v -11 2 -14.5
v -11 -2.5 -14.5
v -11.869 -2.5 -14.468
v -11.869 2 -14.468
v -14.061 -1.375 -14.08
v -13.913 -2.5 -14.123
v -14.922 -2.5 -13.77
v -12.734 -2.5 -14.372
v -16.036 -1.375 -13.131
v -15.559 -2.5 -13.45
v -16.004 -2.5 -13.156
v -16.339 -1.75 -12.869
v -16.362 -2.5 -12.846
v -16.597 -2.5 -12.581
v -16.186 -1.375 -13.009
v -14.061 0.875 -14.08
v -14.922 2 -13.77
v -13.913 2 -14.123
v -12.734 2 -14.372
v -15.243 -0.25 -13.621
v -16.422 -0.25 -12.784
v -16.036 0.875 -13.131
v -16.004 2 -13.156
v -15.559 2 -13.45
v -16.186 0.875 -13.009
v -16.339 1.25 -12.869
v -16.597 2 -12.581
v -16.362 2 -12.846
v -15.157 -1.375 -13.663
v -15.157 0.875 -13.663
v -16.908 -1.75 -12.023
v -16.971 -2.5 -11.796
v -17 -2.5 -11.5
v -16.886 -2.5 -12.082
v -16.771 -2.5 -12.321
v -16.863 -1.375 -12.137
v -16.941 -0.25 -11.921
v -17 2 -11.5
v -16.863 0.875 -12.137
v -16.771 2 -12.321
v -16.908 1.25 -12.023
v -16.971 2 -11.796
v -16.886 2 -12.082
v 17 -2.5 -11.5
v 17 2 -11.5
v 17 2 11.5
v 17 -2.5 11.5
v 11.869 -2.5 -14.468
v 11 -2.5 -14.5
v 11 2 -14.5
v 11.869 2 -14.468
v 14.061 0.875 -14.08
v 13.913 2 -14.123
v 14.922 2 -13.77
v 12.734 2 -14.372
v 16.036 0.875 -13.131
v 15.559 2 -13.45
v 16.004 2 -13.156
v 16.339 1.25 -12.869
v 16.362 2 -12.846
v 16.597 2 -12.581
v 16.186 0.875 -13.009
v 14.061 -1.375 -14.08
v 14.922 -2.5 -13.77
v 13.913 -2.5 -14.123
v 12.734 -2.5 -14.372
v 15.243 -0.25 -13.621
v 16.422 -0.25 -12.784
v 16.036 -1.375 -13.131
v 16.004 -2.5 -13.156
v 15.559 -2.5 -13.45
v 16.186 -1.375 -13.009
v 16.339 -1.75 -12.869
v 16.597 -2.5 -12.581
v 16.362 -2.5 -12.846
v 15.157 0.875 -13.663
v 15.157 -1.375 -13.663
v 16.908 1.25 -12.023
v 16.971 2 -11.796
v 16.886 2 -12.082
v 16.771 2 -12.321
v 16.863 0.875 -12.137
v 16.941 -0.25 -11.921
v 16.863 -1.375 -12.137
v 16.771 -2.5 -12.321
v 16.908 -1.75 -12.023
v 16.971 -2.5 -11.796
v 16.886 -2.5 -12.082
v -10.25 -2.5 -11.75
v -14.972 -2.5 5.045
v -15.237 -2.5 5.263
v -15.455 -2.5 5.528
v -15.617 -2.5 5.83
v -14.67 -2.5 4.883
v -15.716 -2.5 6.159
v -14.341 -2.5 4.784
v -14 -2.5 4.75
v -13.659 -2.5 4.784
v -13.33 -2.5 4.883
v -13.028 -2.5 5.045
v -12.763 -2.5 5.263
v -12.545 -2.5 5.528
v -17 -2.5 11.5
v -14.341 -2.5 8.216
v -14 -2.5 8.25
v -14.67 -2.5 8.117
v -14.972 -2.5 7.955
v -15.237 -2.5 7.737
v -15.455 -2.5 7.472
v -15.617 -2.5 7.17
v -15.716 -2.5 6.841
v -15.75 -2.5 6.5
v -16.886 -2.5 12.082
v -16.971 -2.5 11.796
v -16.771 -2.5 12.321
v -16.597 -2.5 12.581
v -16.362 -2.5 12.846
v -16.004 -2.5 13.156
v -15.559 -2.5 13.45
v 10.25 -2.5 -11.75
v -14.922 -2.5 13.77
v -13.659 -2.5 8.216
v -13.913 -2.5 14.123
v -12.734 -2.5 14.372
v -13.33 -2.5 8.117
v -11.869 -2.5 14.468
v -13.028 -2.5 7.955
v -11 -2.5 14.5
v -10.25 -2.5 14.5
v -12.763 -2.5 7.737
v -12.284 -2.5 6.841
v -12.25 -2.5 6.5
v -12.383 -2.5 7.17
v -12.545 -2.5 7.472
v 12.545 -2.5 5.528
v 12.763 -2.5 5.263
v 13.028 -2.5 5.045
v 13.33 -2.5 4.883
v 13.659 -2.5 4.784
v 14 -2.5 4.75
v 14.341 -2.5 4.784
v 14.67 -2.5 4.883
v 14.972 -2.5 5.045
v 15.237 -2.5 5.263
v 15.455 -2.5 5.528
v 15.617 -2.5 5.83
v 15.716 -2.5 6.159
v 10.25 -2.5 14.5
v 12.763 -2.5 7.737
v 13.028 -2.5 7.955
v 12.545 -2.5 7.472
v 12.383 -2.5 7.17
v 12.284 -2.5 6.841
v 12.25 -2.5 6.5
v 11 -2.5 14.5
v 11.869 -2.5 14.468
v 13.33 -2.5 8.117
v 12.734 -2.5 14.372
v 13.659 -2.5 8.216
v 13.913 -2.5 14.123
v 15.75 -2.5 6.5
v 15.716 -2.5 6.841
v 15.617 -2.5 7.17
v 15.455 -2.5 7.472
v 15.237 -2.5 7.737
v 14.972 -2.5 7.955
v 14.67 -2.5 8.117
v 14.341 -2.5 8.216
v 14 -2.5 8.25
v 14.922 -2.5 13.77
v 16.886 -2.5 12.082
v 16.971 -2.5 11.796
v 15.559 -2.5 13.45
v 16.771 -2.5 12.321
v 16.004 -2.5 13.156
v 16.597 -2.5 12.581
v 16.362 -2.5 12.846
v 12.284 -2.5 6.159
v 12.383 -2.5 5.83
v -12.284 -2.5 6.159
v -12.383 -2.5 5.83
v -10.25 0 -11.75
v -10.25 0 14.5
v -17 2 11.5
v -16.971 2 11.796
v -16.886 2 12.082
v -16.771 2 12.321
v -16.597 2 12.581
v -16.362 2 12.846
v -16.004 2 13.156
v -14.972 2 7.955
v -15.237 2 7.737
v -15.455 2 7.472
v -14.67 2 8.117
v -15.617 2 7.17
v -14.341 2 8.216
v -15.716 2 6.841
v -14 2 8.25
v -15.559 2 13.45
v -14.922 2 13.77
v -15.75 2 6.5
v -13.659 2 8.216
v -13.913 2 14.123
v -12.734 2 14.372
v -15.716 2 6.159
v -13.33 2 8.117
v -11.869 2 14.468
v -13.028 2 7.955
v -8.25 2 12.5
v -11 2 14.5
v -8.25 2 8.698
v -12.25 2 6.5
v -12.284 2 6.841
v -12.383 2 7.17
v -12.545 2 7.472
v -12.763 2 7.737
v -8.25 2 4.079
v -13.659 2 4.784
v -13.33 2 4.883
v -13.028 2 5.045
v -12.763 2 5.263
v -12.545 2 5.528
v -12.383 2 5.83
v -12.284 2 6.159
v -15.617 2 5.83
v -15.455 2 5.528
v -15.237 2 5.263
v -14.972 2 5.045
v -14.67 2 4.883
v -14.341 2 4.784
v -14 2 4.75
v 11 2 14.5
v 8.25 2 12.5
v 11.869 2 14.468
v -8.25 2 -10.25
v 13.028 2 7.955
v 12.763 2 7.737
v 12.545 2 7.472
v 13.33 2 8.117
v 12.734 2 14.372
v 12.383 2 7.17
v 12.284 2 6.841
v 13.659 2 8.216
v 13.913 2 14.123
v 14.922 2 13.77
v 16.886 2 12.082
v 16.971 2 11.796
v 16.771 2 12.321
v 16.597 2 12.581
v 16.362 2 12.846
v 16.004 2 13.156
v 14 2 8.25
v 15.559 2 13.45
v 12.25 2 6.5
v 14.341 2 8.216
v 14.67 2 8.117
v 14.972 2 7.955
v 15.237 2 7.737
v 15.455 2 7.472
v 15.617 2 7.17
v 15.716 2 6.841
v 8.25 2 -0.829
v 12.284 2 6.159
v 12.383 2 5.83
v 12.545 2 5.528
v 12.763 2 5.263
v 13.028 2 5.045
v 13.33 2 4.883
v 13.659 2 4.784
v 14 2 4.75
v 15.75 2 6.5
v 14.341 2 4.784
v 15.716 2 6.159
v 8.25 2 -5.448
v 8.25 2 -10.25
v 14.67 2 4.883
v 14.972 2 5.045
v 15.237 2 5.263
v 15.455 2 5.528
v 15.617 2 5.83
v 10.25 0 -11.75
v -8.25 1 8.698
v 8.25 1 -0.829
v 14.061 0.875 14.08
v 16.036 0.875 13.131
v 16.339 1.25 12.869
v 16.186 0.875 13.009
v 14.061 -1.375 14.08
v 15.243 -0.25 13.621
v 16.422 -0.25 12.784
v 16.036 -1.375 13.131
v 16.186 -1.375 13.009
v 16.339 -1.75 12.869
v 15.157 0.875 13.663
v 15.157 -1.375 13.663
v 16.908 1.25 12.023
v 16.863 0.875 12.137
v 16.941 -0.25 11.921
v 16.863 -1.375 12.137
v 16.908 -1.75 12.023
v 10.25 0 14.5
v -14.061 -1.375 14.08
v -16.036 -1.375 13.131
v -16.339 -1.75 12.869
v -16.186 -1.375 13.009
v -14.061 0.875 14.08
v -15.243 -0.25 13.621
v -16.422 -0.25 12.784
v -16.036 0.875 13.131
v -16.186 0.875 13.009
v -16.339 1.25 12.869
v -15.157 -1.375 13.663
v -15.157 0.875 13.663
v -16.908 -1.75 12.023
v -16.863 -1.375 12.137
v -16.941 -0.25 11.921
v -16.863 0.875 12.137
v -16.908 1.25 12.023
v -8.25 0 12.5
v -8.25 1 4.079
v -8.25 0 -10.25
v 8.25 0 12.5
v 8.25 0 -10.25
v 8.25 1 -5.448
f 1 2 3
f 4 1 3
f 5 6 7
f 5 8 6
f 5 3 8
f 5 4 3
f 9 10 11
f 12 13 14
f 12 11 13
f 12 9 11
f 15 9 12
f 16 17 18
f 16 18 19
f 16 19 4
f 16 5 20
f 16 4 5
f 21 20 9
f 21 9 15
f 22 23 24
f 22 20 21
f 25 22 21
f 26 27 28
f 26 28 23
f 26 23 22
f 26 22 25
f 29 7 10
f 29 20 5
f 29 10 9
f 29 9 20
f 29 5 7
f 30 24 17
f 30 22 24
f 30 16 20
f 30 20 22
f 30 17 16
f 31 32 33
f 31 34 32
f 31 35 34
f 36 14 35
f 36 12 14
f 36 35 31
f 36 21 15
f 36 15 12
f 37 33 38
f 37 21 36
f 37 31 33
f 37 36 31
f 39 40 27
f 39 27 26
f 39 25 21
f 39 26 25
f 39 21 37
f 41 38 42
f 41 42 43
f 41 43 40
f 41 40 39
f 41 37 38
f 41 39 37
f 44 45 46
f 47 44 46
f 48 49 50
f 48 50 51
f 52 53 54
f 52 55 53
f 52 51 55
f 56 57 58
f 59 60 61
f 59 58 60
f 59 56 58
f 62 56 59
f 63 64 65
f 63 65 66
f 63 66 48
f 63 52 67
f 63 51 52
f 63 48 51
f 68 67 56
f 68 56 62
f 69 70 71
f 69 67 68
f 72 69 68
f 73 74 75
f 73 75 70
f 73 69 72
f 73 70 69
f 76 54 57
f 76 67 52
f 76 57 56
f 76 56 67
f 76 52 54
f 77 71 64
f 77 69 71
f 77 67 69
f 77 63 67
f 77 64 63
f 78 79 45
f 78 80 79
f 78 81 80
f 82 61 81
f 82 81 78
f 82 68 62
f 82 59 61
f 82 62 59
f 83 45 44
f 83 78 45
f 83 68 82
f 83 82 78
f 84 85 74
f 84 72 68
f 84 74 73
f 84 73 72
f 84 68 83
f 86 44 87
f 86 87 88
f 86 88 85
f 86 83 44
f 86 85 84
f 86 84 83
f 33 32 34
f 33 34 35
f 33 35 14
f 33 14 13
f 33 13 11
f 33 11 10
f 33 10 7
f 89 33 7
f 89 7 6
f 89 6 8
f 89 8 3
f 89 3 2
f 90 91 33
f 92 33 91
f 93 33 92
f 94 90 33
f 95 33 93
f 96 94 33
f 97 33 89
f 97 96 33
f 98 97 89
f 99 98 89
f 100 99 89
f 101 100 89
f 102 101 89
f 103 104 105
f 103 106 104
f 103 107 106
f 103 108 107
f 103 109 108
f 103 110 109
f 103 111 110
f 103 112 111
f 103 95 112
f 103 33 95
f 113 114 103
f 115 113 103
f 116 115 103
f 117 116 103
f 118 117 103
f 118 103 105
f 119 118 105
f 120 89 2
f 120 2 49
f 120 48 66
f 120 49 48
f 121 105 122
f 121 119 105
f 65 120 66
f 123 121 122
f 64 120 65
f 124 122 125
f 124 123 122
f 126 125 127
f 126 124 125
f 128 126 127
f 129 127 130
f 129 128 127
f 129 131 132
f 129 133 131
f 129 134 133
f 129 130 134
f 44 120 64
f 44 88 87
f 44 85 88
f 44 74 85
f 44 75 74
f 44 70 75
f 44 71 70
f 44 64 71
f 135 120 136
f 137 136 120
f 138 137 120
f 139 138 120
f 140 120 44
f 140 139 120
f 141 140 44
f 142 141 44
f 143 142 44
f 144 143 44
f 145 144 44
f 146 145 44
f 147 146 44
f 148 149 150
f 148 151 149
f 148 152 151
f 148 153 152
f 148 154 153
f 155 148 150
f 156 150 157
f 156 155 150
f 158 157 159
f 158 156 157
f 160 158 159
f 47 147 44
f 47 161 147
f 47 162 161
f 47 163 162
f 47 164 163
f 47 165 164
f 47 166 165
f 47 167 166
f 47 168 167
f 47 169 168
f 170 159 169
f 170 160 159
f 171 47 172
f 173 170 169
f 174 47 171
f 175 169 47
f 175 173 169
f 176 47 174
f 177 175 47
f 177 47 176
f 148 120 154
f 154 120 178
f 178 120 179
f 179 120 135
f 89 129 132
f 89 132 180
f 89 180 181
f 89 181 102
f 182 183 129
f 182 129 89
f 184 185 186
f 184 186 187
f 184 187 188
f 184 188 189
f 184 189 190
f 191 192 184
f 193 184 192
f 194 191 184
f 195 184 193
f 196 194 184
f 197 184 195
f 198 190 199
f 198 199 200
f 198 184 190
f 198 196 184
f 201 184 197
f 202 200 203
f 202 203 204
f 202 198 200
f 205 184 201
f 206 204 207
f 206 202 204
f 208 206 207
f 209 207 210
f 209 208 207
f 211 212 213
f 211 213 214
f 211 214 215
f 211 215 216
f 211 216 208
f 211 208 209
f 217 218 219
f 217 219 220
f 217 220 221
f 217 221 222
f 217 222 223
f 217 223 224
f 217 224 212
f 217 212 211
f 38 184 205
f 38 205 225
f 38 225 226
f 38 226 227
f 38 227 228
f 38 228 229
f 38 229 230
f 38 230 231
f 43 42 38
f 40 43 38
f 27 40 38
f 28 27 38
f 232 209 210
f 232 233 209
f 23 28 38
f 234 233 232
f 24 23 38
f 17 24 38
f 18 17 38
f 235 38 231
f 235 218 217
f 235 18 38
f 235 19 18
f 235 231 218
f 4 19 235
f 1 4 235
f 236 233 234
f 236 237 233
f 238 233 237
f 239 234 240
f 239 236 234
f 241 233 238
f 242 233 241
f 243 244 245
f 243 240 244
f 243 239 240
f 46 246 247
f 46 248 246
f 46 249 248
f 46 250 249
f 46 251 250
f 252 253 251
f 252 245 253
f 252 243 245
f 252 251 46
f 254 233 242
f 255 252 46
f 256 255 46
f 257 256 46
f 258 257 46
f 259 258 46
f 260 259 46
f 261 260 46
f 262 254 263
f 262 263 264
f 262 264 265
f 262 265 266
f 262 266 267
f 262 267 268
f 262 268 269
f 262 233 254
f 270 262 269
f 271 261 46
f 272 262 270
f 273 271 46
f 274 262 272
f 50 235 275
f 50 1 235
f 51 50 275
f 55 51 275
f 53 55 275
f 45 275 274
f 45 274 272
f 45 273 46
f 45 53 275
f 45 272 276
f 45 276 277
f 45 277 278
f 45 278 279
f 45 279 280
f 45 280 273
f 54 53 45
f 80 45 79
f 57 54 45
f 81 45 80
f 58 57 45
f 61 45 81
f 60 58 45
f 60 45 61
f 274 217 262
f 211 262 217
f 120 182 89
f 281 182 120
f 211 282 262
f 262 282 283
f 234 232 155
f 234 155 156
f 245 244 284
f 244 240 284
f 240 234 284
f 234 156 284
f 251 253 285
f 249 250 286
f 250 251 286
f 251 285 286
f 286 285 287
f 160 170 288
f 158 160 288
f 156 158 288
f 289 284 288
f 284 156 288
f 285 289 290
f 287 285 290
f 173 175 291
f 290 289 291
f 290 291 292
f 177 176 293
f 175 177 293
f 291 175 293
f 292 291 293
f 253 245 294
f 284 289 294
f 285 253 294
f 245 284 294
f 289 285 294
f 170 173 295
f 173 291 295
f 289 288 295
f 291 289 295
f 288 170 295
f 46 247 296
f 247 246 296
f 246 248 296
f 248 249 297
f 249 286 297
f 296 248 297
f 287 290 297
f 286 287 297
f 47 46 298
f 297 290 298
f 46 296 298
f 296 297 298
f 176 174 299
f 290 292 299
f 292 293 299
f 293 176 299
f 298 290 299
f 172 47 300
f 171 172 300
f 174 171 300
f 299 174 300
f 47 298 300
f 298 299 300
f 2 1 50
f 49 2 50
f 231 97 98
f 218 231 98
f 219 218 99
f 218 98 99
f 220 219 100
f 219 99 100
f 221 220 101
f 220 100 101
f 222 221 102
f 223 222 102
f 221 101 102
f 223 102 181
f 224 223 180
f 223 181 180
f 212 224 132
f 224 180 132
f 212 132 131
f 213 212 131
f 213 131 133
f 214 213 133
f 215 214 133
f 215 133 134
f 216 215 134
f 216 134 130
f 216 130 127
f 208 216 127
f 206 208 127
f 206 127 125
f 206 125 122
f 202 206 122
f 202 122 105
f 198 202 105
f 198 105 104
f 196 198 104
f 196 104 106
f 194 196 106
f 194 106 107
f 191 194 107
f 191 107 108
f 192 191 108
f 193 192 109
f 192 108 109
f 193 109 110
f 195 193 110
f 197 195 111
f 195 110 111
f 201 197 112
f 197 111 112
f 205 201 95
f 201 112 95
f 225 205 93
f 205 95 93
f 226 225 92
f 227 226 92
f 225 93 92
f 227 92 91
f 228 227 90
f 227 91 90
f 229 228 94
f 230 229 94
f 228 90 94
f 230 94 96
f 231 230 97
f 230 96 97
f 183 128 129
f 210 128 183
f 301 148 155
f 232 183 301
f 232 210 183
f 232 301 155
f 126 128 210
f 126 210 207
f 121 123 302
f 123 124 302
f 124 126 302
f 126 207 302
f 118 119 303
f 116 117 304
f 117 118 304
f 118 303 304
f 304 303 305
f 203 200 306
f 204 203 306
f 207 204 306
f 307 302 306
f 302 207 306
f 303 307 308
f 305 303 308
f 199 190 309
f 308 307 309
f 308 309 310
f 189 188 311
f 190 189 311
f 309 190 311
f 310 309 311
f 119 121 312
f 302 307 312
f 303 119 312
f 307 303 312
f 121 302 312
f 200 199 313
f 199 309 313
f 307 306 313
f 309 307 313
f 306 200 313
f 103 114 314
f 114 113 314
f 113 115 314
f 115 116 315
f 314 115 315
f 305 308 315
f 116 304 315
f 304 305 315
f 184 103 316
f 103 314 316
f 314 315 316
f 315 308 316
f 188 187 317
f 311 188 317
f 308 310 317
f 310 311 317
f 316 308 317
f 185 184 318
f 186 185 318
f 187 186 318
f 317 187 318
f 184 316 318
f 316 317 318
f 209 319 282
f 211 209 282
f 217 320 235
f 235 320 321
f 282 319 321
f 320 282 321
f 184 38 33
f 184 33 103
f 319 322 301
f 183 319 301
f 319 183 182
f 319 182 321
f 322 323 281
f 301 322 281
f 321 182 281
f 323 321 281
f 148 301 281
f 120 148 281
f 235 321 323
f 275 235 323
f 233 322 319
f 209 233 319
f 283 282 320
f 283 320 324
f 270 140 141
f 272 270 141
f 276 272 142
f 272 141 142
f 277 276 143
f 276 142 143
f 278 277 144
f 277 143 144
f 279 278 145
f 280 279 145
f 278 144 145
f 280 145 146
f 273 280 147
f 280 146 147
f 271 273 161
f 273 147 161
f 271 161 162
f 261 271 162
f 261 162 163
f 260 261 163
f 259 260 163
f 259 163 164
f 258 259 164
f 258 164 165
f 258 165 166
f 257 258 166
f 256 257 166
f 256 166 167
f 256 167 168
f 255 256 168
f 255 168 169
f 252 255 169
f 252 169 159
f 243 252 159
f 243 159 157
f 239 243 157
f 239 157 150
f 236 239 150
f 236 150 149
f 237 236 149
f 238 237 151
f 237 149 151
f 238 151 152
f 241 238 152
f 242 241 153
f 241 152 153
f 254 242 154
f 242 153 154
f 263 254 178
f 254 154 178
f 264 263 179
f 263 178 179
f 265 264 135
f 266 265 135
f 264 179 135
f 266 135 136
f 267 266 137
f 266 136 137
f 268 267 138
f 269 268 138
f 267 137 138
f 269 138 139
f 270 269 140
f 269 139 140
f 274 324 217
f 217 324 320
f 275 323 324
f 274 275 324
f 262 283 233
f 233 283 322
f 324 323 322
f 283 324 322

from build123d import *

# Parameters (mm, degrees)
SKETCH1_W           = 34
SKETCH1_H           = 29
BOSS_EXTRUDE1_DEPTH = 2
SKETCH1_4_W         = 6.75
SKETCH1_4_H         = 26.25
BOSS_EXTRUDE2_DEPTH = 2.5
SKETCH2_W           = 34
SKETCH2_H           = 2.75
BOSS_EXTRUDE7_DEPTH = 2.5
CUT_EXTRUDE1_DEPTH  = 23.483327156
SKETCH4_R           = 1.75
CUT_EXTRUDE2_DEPTH  = 23.79254264
SKETCH5_W           = 16.5
SKETCH5_H           = 22.75
CUT_EXTRUDE3_DEPTH  = 1
FILLET1_SIZE        = 6
FILLET1_SIZE_2      = 3


with BuildPart() as part:
    # Sketch1 → Boss-Extrude1 (new body)
    with BuildSketch(Plane(origin=(0, 0, 0), x_dir=(1, 0, 0), z_dir=(0, 1, 0))):
        Rectangle(SKETCH1_W, SKETCH1_H)
    extrude(amount=BOSS_EXTRUDE1_DEPTH)

    # Sketch1<4> → Boss-Extrude2 (add)
    with BuildSketch(Plane(origin=(0, 0, 0), x_dir=(1, 0, 0), z_dir=(0, 1, 0))):
        with Locations((-13.625, -1.375)):
            Rectangle(SKETCH1_4_W, SKETCH1_4_H)
        with Locations((13.625, -1.375)):
            Rectangle(SKETCH1_4_W, SKETCH1_4_H)
    extrude(amount=-BOSS_EXTRUDE2_DEPTH)

    # Sketch2 → Boss-Extrude7 (add)
    with BuildSketch(Plane.XZ):
        with Locations((0, -13.125)):
            Rectangle(SKETCH2_W, SKETCH2_H)
    extrude(amount=BOSS_EXTRUDE7_DEPTH)

    # Sketch3 → Cut-Extrude1 (cut, through all)
    with BuildSketch(Plane.XZ):
        Polygon((-8.25, 12.5), (-8.25, 8.697540798), (8.25, -0.828738644), (8.25, 12.5), align=None)
        Polygon((-8.25, 4.078738644), (-8.25, -10.25), (8.25, -10.25), (8.25, -5.447540798), align=None)
    extrude(amount=-CUT_EXTRUDE1_DEPTH, mode=Mode.SUBTRACT)

    # Sketch4 → Cut-Extrude2 (cut, through all)
    with BuildSketch(Plane.XZ.offset(2.5)):
        with Locations(Location((14, 6.5, 0), (0, 0, 270))):
            Circle(SKETCH4_R)
        with Locations(Location((-14, 6.5, 0), (0, 0, 270))):
            Circle(SKETCH4_R)
    extrude(amount=-CUT_EXTRUDE2_DEPTH, mode=Mode.SUBTRACT)

    # Sketch5 → Cut-Extrude3 (cut)
    with BuildSketch(Plane.XZ):
        with Locations((0, 1.125)):
            Rectangle(SKETCH5_W, SKETCH5_H)
    extrude(amount=-CUT_EXTRUDE3_DEPTH, mode=Mode.SUBTRACT)

    # Fillet1
    # an asymmetric fillet: 6, 3 mm, written as the material it takes off along each edge
    with BuildSketch(Plane(origin=(-17, 17, 14.5), x_dir=(1, 0, 0), z_dir=(0, -1, 0)), Plane(origin=(17, -17.5, 14.5), x_dir=(-1, 0, 0), z_dir=(0, 1, 0))) as fillet1_piece_1:
        with BuildLine():
            Bezier((FILLET1_SIZE, 0), (0, 0), (0, -FILLET1_SIZE_2), weights=[1, 0.707106781, 1])
            Line((0, -FILLET1_SIZE_2), (0, 0))
            Line((0, 0), (FILLET1_SIZE, 0))
        make_face()
    extrude(amount=34.5, mode=Mode.SUBTRACT)
    with BuildSketch(Plane(origin=(-17, 17, -14.5), x_dir=(1, 0, 0), z_dir=(0, -1, 0)), Plane(origin=(17, -17.5, -14.5), x_dir=(-1, 0, 0), z_dir=(0, 1, 0))) as fillet1_piece_2:
        with BuildLine():
            Bezier((FILLET1_SIZE, 0), (0, 0), (0, FILLET1_SIZE_2), weights=[1, 0.707106781, 1])
            Line((0, FILLET1_SIZE_2), (0, 0))
            Line((0, 0), (FILLET1_SIZE, 0))
        make_face()
    extrude(amount=34.5, mode=Mode.SUBTRACT)


solid = part.part
